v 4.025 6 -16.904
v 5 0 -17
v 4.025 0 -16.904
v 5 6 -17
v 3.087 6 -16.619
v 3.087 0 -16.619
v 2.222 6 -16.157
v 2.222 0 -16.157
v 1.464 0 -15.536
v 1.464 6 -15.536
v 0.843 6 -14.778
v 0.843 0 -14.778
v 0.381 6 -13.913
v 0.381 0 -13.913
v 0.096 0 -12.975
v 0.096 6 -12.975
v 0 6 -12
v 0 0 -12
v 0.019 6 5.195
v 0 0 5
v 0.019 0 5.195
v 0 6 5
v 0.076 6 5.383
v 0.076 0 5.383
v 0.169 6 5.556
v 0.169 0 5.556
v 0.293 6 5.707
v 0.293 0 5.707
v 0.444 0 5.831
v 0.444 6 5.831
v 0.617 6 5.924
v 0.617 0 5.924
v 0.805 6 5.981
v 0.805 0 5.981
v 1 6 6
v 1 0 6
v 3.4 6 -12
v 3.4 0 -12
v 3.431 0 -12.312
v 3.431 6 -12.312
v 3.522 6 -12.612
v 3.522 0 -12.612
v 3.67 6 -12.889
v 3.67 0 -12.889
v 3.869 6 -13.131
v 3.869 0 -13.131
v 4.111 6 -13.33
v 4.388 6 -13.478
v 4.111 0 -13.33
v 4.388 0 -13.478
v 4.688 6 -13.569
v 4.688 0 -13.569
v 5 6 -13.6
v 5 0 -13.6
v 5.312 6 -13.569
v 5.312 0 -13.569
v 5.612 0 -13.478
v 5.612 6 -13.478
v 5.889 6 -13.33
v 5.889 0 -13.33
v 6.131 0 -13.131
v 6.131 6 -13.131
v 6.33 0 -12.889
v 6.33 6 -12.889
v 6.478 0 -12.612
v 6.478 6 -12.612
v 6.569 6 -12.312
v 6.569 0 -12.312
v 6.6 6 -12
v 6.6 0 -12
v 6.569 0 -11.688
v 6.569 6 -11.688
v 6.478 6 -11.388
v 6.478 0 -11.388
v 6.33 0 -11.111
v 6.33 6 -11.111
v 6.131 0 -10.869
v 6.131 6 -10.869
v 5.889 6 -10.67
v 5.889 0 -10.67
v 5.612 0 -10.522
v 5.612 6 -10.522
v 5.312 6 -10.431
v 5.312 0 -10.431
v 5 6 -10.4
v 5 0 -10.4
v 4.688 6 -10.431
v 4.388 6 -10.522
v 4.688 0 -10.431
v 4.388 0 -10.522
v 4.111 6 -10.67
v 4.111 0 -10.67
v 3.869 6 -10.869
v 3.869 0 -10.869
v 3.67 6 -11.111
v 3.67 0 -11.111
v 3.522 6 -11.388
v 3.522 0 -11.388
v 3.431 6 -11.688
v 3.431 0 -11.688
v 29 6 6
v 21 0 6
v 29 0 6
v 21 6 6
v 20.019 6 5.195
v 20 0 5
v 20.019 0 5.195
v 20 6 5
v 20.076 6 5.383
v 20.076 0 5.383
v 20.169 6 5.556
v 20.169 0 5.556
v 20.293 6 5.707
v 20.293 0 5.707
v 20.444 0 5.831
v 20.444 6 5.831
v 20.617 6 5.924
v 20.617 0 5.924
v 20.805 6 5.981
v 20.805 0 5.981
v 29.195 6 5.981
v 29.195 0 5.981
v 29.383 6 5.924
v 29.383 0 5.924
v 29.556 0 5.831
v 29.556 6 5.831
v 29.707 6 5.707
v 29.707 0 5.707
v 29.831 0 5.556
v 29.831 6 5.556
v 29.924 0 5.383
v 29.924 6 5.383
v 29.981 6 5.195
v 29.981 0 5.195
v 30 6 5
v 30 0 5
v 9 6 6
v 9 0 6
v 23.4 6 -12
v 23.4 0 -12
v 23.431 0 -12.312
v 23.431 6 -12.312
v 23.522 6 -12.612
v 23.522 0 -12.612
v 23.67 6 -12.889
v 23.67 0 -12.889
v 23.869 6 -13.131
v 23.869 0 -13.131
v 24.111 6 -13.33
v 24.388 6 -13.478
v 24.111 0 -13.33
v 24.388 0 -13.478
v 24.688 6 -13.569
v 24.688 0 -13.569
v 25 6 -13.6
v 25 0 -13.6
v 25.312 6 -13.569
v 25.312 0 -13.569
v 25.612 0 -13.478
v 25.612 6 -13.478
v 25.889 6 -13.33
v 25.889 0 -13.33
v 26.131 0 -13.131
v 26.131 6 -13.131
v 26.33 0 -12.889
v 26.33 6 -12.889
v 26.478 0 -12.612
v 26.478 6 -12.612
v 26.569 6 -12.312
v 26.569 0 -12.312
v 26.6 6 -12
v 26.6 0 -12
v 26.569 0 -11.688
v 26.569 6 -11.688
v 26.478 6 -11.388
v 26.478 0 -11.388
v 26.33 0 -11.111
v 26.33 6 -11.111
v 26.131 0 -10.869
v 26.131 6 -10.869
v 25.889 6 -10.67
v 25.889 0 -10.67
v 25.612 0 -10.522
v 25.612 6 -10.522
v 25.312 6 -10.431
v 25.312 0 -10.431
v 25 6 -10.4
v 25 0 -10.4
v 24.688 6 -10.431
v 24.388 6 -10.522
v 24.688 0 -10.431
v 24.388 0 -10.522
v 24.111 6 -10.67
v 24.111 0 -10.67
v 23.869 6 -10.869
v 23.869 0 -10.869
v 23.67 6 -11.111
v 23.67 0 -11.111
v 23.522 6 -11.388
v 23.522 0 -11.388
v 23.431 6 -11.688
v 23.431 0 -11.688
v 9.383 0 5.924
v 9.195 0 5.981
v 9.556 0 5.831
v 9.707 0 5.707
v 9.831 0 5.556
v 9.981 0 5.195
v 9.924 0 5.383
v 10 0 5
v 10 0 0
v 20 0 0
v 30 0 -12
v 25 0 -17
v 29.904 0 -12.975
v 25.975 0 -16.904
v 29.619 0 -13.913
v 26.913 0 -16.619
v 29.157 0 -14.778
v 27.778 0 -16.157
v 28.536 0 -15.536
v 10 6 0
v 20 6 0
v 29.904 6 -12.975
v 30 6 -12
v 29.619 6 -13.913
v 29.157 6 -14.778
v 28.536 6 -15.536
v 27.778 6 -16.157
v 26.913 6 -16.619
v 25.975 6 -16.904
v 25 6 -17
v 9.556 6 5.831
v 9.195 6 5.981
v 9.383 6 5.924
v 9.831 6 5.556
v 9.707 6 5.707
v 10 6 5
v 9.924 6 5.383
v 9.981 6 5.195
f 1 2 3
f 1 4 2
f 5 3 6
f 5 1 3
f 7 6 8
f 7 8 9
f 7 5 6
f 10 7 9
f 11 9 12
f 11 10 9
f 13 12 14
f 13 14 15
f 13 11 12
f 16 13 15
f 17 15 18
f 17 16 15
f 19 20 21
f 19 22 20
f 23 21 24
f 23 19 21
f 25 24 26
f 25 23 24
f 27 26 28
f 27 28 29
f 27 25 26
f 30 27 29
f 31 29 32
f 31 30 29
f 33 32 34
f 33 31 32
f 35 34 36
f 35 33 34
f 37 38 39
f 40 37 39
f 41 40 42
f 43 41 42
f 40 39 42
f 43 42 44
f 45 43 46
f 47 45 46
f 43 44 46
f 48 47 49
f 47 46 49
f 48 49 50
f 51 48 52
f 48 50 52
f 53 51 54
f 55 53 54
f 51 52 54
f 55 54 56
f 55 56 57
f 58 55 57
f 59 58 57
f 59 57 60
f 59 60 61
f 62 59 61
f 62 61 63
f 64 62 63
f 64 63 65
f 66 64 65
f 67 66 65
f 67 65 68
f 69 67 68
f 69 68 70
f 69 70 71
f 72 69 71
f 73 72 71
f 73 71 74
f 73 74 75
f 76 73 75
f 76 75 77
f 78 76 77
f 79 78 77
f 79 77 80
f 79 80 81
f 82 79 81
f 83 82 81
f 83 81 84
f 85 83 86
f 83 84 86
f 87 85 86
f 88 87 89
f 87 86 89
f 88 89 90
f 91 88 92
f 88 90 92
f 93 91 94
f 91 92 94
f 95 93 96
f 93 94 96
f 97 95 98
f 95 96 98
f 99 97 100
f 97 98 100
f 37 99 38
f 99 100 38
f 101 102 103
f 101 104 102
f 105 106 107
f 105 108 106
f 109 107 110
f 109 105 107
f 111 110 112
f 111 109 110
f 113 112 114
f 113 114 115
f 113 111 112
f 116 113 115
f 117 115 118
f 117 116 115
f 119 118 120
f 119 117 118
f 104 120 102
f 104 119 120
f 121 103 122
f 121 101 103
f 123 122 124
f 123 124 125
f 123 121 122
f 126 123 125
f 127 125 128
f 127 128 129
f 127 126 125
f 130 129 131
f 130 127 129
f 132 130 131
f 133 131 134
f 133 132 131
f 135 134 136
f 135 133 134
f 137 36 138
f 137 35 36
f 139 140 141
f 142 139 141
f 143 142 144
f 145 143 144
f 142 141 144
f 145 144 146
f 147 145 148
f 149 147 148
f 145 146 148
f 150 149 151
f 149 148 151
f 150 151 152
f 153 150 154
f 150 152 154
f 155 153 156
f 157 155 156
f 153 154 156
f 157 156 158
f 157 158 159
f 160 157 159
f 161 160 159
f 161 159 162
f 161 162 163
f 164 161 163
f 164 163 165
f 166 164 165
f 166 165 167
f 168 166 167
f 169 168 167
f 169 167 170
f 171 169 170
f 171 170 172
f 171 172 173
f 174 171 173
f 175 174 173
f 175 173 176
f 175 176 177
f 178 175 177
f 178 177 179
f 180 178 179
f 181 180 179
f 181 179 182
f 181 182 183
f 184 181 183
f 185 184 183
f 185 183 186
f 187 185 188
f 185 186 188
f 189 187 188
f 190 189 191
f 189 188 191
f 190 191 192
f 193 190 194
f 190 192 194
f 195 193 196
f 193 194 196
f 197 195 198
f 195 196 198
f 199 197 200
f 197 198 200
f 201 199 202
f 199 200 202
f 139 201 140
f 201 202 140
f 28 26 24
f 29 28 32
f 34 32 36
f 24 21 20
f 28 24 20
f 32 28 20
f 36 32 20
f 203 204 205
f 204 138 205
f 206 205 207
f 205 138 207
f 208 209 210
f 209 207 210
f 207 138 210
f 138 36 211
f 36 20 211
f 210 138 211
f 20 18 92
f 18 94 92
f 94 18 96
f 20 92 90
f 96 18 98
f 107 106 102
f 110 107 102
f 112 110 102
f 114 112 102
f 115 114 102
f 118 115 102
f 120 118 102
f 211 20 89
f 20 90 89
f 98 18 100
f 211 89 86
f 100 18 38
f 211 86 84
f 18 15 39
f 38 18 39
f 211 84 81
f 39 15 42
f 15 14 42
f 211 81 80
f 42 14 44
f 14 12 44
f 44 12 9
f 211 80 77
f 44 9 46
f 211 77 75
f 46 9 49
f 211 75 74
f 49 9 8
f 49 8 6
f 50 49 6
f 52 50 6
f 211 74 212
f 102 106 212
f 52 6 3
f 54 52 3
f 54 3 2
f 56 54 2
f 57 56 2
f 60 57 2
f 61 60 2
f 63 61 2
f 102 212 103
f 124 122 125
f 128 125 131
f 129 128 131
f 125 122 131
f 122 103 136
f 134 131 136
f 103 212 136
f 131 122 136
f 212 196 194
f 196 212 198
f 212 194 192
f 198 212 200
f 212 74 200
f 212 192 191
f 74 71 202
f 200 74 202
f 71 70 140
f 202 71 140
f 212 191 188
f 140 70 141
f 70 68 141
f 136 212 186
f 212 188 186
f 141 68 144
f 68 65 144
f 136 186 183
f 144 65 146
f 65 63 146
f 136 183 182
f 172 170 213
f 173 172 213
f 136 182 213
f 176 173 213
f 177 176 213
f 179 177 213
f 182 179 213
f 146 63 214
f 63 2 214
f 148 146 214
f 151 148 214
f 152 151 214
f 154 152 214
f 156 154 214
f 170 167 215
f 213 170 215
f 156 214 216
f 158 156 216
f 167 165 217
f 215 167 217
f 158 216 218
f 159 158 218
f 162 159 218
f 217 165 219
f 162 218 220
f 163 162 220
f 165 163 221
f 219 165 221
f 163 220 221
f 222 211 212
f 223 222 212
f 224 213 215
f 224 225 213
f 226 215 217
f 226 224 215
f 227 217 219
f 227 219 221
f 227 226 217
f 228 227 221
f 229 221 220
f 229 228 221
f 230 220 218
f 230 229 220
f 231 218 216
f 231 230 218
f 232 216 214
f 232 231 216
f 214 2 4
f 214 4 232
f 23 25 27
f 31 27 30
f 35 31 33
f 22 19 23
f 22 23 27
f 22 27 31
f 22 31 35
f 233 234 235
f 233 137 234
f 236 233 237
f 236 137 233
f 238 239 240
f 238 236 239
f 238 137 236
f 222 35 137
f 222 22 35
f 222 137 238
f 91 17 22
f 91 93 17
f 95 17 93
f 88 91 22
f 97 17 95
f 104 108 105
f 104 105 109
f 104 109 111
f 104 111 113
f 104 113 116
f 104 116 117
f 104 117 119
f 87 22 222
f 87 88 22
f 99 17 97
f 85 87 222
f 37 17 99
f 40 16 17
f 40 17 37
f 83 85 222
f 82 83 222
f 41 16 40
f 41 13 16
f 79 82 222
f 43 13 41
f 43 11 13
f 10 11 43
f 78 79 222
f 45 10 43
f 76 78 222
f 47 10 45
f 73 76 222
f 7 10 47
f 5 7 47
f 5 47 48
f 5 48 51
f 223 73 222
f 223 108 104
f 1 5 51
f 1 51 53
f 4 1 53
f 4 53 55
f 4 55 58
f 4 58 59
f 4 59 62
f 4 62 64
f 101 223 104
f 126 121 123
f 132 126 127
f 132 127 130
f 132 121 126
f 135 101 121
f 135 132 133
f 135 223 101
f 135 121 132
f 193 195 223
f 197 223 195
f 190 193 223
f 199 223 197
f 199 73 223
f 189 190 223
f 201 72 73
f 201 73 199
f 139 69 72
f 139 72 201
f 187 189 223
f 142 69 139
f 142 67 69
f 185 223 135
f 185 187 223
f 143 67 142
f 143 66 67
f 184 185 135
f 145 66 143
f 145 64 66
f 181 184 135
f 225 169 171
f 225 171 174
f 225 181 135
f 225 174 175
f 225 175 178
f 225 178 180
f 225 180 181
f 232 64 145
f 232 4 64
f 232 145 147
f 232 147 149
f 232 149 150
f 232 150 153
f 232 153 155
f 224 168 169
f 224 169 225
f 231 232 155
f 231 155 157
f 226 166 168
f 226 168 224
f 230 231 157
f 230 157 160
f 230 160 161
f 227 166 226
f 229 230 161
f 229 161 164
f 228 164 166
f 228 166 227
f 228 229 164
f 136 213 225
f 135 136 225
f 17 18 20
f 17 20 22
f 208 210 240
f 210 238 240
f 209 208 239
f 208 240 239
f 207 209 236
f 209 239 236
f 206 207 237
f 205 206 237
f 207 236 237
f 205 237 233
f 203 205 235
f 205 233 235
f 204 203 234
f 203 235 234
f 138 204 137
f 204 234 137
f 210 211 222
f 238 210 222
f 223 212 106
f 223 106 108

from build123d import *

# Parameters (mm, degrees)
SKETCH1_W              = 30
SKETCH1_H              = 17
BOSS_EXTRUDE1_DEPTH    = 6
SKETCH234_W            = 10
SKETCH234_H            = 6
BOSS_EXTRUDE234_DEPTH  = 6
FILLET134_R            = 1
SKETCH2341_W           = 10
SKETCH2341_H           = 6
BOSS_EXTRUDE2341_DEPTH = 6
FILLET1341_R           = 1
M3_CLEARANCE_HOLE1_D   = 3.2
FILLET1342_R           = 5


with BuildPart() as part:
    # Sketch1 → Boss-Extrude1 (new body)
    with BuildSketch(Plane(origin=(0, 0, 0), x_dir=(1, 0, 0), z_dir=(0, 1, 0))):
        with Locations((15, 8.5)):
            Rectangle(SKETCH1_W, SKETCH1_H)
    extrude(amount=BOSS_EXTRUDE1_DEPTH)

    # Sketch234 → Boss-Extrude234 (add)
    with BuildSketch(Plane(origin=(4.232221392, 0, 0), x_dir=(1, 0, 0), z_dir=(0, 0, 1))):
        with Locations((0.767778608, 3)):
            Rectangle(SKETCH234_W, SKETCH234_H)
    extrude(amount=BOSS_EXTRUDE234_DEPTH)

    # Fillet134
    fillet134_edges = [part.edges().sort_by_distance(p)[0] for p in [
        (0, 3, 6),
        (10, 3, 6),
    ]]
    fillet(fillet134_edges, radius=FILLET134_R)

    # Sketch2341 → Boss-Extrude2341 (add)
    with BuildSketch(Plane(origin=(24.232221392, 0, 0), x_dir=(1, 0, 0), z_dir=(0, 0, 1))):
        with Locations((0.767778608, 3)):
            Rectangle(SKETCH2341_W, SKETCH2341_H)
    extrude(amount=BOSS_EXTRUDE2341_DEPTH)

    # Fillet1341
    fillet1341_edges = [part.edges().sort_by_distance(p)[0] for p in [
        (30, 3, 6),
        (20, 3, 6),
    ]]
    fillet(fillet1341_edges, radius=FILLET1341_R)

    # M3 Clearance Hole1 (through all)
    with Locations(Plane(origin=(0, 6, 0), x_dir=(1, 0, 0), z_dir=(0, 1, 0))):
        with Locations((5, 12), (25, 12)):
            Hole(M3_CLEARANCE_HOLE1_D / 2)

    # Fillet1342
    fillet1342_edges = [part.edges().sort_by_distance(p)[0] for p in [
        (0, 3, -17),
        (30, 3, -17),
    ]]
    fillet(fillet1342_edges, radius=FILLET1342_R)


solid = part.part
